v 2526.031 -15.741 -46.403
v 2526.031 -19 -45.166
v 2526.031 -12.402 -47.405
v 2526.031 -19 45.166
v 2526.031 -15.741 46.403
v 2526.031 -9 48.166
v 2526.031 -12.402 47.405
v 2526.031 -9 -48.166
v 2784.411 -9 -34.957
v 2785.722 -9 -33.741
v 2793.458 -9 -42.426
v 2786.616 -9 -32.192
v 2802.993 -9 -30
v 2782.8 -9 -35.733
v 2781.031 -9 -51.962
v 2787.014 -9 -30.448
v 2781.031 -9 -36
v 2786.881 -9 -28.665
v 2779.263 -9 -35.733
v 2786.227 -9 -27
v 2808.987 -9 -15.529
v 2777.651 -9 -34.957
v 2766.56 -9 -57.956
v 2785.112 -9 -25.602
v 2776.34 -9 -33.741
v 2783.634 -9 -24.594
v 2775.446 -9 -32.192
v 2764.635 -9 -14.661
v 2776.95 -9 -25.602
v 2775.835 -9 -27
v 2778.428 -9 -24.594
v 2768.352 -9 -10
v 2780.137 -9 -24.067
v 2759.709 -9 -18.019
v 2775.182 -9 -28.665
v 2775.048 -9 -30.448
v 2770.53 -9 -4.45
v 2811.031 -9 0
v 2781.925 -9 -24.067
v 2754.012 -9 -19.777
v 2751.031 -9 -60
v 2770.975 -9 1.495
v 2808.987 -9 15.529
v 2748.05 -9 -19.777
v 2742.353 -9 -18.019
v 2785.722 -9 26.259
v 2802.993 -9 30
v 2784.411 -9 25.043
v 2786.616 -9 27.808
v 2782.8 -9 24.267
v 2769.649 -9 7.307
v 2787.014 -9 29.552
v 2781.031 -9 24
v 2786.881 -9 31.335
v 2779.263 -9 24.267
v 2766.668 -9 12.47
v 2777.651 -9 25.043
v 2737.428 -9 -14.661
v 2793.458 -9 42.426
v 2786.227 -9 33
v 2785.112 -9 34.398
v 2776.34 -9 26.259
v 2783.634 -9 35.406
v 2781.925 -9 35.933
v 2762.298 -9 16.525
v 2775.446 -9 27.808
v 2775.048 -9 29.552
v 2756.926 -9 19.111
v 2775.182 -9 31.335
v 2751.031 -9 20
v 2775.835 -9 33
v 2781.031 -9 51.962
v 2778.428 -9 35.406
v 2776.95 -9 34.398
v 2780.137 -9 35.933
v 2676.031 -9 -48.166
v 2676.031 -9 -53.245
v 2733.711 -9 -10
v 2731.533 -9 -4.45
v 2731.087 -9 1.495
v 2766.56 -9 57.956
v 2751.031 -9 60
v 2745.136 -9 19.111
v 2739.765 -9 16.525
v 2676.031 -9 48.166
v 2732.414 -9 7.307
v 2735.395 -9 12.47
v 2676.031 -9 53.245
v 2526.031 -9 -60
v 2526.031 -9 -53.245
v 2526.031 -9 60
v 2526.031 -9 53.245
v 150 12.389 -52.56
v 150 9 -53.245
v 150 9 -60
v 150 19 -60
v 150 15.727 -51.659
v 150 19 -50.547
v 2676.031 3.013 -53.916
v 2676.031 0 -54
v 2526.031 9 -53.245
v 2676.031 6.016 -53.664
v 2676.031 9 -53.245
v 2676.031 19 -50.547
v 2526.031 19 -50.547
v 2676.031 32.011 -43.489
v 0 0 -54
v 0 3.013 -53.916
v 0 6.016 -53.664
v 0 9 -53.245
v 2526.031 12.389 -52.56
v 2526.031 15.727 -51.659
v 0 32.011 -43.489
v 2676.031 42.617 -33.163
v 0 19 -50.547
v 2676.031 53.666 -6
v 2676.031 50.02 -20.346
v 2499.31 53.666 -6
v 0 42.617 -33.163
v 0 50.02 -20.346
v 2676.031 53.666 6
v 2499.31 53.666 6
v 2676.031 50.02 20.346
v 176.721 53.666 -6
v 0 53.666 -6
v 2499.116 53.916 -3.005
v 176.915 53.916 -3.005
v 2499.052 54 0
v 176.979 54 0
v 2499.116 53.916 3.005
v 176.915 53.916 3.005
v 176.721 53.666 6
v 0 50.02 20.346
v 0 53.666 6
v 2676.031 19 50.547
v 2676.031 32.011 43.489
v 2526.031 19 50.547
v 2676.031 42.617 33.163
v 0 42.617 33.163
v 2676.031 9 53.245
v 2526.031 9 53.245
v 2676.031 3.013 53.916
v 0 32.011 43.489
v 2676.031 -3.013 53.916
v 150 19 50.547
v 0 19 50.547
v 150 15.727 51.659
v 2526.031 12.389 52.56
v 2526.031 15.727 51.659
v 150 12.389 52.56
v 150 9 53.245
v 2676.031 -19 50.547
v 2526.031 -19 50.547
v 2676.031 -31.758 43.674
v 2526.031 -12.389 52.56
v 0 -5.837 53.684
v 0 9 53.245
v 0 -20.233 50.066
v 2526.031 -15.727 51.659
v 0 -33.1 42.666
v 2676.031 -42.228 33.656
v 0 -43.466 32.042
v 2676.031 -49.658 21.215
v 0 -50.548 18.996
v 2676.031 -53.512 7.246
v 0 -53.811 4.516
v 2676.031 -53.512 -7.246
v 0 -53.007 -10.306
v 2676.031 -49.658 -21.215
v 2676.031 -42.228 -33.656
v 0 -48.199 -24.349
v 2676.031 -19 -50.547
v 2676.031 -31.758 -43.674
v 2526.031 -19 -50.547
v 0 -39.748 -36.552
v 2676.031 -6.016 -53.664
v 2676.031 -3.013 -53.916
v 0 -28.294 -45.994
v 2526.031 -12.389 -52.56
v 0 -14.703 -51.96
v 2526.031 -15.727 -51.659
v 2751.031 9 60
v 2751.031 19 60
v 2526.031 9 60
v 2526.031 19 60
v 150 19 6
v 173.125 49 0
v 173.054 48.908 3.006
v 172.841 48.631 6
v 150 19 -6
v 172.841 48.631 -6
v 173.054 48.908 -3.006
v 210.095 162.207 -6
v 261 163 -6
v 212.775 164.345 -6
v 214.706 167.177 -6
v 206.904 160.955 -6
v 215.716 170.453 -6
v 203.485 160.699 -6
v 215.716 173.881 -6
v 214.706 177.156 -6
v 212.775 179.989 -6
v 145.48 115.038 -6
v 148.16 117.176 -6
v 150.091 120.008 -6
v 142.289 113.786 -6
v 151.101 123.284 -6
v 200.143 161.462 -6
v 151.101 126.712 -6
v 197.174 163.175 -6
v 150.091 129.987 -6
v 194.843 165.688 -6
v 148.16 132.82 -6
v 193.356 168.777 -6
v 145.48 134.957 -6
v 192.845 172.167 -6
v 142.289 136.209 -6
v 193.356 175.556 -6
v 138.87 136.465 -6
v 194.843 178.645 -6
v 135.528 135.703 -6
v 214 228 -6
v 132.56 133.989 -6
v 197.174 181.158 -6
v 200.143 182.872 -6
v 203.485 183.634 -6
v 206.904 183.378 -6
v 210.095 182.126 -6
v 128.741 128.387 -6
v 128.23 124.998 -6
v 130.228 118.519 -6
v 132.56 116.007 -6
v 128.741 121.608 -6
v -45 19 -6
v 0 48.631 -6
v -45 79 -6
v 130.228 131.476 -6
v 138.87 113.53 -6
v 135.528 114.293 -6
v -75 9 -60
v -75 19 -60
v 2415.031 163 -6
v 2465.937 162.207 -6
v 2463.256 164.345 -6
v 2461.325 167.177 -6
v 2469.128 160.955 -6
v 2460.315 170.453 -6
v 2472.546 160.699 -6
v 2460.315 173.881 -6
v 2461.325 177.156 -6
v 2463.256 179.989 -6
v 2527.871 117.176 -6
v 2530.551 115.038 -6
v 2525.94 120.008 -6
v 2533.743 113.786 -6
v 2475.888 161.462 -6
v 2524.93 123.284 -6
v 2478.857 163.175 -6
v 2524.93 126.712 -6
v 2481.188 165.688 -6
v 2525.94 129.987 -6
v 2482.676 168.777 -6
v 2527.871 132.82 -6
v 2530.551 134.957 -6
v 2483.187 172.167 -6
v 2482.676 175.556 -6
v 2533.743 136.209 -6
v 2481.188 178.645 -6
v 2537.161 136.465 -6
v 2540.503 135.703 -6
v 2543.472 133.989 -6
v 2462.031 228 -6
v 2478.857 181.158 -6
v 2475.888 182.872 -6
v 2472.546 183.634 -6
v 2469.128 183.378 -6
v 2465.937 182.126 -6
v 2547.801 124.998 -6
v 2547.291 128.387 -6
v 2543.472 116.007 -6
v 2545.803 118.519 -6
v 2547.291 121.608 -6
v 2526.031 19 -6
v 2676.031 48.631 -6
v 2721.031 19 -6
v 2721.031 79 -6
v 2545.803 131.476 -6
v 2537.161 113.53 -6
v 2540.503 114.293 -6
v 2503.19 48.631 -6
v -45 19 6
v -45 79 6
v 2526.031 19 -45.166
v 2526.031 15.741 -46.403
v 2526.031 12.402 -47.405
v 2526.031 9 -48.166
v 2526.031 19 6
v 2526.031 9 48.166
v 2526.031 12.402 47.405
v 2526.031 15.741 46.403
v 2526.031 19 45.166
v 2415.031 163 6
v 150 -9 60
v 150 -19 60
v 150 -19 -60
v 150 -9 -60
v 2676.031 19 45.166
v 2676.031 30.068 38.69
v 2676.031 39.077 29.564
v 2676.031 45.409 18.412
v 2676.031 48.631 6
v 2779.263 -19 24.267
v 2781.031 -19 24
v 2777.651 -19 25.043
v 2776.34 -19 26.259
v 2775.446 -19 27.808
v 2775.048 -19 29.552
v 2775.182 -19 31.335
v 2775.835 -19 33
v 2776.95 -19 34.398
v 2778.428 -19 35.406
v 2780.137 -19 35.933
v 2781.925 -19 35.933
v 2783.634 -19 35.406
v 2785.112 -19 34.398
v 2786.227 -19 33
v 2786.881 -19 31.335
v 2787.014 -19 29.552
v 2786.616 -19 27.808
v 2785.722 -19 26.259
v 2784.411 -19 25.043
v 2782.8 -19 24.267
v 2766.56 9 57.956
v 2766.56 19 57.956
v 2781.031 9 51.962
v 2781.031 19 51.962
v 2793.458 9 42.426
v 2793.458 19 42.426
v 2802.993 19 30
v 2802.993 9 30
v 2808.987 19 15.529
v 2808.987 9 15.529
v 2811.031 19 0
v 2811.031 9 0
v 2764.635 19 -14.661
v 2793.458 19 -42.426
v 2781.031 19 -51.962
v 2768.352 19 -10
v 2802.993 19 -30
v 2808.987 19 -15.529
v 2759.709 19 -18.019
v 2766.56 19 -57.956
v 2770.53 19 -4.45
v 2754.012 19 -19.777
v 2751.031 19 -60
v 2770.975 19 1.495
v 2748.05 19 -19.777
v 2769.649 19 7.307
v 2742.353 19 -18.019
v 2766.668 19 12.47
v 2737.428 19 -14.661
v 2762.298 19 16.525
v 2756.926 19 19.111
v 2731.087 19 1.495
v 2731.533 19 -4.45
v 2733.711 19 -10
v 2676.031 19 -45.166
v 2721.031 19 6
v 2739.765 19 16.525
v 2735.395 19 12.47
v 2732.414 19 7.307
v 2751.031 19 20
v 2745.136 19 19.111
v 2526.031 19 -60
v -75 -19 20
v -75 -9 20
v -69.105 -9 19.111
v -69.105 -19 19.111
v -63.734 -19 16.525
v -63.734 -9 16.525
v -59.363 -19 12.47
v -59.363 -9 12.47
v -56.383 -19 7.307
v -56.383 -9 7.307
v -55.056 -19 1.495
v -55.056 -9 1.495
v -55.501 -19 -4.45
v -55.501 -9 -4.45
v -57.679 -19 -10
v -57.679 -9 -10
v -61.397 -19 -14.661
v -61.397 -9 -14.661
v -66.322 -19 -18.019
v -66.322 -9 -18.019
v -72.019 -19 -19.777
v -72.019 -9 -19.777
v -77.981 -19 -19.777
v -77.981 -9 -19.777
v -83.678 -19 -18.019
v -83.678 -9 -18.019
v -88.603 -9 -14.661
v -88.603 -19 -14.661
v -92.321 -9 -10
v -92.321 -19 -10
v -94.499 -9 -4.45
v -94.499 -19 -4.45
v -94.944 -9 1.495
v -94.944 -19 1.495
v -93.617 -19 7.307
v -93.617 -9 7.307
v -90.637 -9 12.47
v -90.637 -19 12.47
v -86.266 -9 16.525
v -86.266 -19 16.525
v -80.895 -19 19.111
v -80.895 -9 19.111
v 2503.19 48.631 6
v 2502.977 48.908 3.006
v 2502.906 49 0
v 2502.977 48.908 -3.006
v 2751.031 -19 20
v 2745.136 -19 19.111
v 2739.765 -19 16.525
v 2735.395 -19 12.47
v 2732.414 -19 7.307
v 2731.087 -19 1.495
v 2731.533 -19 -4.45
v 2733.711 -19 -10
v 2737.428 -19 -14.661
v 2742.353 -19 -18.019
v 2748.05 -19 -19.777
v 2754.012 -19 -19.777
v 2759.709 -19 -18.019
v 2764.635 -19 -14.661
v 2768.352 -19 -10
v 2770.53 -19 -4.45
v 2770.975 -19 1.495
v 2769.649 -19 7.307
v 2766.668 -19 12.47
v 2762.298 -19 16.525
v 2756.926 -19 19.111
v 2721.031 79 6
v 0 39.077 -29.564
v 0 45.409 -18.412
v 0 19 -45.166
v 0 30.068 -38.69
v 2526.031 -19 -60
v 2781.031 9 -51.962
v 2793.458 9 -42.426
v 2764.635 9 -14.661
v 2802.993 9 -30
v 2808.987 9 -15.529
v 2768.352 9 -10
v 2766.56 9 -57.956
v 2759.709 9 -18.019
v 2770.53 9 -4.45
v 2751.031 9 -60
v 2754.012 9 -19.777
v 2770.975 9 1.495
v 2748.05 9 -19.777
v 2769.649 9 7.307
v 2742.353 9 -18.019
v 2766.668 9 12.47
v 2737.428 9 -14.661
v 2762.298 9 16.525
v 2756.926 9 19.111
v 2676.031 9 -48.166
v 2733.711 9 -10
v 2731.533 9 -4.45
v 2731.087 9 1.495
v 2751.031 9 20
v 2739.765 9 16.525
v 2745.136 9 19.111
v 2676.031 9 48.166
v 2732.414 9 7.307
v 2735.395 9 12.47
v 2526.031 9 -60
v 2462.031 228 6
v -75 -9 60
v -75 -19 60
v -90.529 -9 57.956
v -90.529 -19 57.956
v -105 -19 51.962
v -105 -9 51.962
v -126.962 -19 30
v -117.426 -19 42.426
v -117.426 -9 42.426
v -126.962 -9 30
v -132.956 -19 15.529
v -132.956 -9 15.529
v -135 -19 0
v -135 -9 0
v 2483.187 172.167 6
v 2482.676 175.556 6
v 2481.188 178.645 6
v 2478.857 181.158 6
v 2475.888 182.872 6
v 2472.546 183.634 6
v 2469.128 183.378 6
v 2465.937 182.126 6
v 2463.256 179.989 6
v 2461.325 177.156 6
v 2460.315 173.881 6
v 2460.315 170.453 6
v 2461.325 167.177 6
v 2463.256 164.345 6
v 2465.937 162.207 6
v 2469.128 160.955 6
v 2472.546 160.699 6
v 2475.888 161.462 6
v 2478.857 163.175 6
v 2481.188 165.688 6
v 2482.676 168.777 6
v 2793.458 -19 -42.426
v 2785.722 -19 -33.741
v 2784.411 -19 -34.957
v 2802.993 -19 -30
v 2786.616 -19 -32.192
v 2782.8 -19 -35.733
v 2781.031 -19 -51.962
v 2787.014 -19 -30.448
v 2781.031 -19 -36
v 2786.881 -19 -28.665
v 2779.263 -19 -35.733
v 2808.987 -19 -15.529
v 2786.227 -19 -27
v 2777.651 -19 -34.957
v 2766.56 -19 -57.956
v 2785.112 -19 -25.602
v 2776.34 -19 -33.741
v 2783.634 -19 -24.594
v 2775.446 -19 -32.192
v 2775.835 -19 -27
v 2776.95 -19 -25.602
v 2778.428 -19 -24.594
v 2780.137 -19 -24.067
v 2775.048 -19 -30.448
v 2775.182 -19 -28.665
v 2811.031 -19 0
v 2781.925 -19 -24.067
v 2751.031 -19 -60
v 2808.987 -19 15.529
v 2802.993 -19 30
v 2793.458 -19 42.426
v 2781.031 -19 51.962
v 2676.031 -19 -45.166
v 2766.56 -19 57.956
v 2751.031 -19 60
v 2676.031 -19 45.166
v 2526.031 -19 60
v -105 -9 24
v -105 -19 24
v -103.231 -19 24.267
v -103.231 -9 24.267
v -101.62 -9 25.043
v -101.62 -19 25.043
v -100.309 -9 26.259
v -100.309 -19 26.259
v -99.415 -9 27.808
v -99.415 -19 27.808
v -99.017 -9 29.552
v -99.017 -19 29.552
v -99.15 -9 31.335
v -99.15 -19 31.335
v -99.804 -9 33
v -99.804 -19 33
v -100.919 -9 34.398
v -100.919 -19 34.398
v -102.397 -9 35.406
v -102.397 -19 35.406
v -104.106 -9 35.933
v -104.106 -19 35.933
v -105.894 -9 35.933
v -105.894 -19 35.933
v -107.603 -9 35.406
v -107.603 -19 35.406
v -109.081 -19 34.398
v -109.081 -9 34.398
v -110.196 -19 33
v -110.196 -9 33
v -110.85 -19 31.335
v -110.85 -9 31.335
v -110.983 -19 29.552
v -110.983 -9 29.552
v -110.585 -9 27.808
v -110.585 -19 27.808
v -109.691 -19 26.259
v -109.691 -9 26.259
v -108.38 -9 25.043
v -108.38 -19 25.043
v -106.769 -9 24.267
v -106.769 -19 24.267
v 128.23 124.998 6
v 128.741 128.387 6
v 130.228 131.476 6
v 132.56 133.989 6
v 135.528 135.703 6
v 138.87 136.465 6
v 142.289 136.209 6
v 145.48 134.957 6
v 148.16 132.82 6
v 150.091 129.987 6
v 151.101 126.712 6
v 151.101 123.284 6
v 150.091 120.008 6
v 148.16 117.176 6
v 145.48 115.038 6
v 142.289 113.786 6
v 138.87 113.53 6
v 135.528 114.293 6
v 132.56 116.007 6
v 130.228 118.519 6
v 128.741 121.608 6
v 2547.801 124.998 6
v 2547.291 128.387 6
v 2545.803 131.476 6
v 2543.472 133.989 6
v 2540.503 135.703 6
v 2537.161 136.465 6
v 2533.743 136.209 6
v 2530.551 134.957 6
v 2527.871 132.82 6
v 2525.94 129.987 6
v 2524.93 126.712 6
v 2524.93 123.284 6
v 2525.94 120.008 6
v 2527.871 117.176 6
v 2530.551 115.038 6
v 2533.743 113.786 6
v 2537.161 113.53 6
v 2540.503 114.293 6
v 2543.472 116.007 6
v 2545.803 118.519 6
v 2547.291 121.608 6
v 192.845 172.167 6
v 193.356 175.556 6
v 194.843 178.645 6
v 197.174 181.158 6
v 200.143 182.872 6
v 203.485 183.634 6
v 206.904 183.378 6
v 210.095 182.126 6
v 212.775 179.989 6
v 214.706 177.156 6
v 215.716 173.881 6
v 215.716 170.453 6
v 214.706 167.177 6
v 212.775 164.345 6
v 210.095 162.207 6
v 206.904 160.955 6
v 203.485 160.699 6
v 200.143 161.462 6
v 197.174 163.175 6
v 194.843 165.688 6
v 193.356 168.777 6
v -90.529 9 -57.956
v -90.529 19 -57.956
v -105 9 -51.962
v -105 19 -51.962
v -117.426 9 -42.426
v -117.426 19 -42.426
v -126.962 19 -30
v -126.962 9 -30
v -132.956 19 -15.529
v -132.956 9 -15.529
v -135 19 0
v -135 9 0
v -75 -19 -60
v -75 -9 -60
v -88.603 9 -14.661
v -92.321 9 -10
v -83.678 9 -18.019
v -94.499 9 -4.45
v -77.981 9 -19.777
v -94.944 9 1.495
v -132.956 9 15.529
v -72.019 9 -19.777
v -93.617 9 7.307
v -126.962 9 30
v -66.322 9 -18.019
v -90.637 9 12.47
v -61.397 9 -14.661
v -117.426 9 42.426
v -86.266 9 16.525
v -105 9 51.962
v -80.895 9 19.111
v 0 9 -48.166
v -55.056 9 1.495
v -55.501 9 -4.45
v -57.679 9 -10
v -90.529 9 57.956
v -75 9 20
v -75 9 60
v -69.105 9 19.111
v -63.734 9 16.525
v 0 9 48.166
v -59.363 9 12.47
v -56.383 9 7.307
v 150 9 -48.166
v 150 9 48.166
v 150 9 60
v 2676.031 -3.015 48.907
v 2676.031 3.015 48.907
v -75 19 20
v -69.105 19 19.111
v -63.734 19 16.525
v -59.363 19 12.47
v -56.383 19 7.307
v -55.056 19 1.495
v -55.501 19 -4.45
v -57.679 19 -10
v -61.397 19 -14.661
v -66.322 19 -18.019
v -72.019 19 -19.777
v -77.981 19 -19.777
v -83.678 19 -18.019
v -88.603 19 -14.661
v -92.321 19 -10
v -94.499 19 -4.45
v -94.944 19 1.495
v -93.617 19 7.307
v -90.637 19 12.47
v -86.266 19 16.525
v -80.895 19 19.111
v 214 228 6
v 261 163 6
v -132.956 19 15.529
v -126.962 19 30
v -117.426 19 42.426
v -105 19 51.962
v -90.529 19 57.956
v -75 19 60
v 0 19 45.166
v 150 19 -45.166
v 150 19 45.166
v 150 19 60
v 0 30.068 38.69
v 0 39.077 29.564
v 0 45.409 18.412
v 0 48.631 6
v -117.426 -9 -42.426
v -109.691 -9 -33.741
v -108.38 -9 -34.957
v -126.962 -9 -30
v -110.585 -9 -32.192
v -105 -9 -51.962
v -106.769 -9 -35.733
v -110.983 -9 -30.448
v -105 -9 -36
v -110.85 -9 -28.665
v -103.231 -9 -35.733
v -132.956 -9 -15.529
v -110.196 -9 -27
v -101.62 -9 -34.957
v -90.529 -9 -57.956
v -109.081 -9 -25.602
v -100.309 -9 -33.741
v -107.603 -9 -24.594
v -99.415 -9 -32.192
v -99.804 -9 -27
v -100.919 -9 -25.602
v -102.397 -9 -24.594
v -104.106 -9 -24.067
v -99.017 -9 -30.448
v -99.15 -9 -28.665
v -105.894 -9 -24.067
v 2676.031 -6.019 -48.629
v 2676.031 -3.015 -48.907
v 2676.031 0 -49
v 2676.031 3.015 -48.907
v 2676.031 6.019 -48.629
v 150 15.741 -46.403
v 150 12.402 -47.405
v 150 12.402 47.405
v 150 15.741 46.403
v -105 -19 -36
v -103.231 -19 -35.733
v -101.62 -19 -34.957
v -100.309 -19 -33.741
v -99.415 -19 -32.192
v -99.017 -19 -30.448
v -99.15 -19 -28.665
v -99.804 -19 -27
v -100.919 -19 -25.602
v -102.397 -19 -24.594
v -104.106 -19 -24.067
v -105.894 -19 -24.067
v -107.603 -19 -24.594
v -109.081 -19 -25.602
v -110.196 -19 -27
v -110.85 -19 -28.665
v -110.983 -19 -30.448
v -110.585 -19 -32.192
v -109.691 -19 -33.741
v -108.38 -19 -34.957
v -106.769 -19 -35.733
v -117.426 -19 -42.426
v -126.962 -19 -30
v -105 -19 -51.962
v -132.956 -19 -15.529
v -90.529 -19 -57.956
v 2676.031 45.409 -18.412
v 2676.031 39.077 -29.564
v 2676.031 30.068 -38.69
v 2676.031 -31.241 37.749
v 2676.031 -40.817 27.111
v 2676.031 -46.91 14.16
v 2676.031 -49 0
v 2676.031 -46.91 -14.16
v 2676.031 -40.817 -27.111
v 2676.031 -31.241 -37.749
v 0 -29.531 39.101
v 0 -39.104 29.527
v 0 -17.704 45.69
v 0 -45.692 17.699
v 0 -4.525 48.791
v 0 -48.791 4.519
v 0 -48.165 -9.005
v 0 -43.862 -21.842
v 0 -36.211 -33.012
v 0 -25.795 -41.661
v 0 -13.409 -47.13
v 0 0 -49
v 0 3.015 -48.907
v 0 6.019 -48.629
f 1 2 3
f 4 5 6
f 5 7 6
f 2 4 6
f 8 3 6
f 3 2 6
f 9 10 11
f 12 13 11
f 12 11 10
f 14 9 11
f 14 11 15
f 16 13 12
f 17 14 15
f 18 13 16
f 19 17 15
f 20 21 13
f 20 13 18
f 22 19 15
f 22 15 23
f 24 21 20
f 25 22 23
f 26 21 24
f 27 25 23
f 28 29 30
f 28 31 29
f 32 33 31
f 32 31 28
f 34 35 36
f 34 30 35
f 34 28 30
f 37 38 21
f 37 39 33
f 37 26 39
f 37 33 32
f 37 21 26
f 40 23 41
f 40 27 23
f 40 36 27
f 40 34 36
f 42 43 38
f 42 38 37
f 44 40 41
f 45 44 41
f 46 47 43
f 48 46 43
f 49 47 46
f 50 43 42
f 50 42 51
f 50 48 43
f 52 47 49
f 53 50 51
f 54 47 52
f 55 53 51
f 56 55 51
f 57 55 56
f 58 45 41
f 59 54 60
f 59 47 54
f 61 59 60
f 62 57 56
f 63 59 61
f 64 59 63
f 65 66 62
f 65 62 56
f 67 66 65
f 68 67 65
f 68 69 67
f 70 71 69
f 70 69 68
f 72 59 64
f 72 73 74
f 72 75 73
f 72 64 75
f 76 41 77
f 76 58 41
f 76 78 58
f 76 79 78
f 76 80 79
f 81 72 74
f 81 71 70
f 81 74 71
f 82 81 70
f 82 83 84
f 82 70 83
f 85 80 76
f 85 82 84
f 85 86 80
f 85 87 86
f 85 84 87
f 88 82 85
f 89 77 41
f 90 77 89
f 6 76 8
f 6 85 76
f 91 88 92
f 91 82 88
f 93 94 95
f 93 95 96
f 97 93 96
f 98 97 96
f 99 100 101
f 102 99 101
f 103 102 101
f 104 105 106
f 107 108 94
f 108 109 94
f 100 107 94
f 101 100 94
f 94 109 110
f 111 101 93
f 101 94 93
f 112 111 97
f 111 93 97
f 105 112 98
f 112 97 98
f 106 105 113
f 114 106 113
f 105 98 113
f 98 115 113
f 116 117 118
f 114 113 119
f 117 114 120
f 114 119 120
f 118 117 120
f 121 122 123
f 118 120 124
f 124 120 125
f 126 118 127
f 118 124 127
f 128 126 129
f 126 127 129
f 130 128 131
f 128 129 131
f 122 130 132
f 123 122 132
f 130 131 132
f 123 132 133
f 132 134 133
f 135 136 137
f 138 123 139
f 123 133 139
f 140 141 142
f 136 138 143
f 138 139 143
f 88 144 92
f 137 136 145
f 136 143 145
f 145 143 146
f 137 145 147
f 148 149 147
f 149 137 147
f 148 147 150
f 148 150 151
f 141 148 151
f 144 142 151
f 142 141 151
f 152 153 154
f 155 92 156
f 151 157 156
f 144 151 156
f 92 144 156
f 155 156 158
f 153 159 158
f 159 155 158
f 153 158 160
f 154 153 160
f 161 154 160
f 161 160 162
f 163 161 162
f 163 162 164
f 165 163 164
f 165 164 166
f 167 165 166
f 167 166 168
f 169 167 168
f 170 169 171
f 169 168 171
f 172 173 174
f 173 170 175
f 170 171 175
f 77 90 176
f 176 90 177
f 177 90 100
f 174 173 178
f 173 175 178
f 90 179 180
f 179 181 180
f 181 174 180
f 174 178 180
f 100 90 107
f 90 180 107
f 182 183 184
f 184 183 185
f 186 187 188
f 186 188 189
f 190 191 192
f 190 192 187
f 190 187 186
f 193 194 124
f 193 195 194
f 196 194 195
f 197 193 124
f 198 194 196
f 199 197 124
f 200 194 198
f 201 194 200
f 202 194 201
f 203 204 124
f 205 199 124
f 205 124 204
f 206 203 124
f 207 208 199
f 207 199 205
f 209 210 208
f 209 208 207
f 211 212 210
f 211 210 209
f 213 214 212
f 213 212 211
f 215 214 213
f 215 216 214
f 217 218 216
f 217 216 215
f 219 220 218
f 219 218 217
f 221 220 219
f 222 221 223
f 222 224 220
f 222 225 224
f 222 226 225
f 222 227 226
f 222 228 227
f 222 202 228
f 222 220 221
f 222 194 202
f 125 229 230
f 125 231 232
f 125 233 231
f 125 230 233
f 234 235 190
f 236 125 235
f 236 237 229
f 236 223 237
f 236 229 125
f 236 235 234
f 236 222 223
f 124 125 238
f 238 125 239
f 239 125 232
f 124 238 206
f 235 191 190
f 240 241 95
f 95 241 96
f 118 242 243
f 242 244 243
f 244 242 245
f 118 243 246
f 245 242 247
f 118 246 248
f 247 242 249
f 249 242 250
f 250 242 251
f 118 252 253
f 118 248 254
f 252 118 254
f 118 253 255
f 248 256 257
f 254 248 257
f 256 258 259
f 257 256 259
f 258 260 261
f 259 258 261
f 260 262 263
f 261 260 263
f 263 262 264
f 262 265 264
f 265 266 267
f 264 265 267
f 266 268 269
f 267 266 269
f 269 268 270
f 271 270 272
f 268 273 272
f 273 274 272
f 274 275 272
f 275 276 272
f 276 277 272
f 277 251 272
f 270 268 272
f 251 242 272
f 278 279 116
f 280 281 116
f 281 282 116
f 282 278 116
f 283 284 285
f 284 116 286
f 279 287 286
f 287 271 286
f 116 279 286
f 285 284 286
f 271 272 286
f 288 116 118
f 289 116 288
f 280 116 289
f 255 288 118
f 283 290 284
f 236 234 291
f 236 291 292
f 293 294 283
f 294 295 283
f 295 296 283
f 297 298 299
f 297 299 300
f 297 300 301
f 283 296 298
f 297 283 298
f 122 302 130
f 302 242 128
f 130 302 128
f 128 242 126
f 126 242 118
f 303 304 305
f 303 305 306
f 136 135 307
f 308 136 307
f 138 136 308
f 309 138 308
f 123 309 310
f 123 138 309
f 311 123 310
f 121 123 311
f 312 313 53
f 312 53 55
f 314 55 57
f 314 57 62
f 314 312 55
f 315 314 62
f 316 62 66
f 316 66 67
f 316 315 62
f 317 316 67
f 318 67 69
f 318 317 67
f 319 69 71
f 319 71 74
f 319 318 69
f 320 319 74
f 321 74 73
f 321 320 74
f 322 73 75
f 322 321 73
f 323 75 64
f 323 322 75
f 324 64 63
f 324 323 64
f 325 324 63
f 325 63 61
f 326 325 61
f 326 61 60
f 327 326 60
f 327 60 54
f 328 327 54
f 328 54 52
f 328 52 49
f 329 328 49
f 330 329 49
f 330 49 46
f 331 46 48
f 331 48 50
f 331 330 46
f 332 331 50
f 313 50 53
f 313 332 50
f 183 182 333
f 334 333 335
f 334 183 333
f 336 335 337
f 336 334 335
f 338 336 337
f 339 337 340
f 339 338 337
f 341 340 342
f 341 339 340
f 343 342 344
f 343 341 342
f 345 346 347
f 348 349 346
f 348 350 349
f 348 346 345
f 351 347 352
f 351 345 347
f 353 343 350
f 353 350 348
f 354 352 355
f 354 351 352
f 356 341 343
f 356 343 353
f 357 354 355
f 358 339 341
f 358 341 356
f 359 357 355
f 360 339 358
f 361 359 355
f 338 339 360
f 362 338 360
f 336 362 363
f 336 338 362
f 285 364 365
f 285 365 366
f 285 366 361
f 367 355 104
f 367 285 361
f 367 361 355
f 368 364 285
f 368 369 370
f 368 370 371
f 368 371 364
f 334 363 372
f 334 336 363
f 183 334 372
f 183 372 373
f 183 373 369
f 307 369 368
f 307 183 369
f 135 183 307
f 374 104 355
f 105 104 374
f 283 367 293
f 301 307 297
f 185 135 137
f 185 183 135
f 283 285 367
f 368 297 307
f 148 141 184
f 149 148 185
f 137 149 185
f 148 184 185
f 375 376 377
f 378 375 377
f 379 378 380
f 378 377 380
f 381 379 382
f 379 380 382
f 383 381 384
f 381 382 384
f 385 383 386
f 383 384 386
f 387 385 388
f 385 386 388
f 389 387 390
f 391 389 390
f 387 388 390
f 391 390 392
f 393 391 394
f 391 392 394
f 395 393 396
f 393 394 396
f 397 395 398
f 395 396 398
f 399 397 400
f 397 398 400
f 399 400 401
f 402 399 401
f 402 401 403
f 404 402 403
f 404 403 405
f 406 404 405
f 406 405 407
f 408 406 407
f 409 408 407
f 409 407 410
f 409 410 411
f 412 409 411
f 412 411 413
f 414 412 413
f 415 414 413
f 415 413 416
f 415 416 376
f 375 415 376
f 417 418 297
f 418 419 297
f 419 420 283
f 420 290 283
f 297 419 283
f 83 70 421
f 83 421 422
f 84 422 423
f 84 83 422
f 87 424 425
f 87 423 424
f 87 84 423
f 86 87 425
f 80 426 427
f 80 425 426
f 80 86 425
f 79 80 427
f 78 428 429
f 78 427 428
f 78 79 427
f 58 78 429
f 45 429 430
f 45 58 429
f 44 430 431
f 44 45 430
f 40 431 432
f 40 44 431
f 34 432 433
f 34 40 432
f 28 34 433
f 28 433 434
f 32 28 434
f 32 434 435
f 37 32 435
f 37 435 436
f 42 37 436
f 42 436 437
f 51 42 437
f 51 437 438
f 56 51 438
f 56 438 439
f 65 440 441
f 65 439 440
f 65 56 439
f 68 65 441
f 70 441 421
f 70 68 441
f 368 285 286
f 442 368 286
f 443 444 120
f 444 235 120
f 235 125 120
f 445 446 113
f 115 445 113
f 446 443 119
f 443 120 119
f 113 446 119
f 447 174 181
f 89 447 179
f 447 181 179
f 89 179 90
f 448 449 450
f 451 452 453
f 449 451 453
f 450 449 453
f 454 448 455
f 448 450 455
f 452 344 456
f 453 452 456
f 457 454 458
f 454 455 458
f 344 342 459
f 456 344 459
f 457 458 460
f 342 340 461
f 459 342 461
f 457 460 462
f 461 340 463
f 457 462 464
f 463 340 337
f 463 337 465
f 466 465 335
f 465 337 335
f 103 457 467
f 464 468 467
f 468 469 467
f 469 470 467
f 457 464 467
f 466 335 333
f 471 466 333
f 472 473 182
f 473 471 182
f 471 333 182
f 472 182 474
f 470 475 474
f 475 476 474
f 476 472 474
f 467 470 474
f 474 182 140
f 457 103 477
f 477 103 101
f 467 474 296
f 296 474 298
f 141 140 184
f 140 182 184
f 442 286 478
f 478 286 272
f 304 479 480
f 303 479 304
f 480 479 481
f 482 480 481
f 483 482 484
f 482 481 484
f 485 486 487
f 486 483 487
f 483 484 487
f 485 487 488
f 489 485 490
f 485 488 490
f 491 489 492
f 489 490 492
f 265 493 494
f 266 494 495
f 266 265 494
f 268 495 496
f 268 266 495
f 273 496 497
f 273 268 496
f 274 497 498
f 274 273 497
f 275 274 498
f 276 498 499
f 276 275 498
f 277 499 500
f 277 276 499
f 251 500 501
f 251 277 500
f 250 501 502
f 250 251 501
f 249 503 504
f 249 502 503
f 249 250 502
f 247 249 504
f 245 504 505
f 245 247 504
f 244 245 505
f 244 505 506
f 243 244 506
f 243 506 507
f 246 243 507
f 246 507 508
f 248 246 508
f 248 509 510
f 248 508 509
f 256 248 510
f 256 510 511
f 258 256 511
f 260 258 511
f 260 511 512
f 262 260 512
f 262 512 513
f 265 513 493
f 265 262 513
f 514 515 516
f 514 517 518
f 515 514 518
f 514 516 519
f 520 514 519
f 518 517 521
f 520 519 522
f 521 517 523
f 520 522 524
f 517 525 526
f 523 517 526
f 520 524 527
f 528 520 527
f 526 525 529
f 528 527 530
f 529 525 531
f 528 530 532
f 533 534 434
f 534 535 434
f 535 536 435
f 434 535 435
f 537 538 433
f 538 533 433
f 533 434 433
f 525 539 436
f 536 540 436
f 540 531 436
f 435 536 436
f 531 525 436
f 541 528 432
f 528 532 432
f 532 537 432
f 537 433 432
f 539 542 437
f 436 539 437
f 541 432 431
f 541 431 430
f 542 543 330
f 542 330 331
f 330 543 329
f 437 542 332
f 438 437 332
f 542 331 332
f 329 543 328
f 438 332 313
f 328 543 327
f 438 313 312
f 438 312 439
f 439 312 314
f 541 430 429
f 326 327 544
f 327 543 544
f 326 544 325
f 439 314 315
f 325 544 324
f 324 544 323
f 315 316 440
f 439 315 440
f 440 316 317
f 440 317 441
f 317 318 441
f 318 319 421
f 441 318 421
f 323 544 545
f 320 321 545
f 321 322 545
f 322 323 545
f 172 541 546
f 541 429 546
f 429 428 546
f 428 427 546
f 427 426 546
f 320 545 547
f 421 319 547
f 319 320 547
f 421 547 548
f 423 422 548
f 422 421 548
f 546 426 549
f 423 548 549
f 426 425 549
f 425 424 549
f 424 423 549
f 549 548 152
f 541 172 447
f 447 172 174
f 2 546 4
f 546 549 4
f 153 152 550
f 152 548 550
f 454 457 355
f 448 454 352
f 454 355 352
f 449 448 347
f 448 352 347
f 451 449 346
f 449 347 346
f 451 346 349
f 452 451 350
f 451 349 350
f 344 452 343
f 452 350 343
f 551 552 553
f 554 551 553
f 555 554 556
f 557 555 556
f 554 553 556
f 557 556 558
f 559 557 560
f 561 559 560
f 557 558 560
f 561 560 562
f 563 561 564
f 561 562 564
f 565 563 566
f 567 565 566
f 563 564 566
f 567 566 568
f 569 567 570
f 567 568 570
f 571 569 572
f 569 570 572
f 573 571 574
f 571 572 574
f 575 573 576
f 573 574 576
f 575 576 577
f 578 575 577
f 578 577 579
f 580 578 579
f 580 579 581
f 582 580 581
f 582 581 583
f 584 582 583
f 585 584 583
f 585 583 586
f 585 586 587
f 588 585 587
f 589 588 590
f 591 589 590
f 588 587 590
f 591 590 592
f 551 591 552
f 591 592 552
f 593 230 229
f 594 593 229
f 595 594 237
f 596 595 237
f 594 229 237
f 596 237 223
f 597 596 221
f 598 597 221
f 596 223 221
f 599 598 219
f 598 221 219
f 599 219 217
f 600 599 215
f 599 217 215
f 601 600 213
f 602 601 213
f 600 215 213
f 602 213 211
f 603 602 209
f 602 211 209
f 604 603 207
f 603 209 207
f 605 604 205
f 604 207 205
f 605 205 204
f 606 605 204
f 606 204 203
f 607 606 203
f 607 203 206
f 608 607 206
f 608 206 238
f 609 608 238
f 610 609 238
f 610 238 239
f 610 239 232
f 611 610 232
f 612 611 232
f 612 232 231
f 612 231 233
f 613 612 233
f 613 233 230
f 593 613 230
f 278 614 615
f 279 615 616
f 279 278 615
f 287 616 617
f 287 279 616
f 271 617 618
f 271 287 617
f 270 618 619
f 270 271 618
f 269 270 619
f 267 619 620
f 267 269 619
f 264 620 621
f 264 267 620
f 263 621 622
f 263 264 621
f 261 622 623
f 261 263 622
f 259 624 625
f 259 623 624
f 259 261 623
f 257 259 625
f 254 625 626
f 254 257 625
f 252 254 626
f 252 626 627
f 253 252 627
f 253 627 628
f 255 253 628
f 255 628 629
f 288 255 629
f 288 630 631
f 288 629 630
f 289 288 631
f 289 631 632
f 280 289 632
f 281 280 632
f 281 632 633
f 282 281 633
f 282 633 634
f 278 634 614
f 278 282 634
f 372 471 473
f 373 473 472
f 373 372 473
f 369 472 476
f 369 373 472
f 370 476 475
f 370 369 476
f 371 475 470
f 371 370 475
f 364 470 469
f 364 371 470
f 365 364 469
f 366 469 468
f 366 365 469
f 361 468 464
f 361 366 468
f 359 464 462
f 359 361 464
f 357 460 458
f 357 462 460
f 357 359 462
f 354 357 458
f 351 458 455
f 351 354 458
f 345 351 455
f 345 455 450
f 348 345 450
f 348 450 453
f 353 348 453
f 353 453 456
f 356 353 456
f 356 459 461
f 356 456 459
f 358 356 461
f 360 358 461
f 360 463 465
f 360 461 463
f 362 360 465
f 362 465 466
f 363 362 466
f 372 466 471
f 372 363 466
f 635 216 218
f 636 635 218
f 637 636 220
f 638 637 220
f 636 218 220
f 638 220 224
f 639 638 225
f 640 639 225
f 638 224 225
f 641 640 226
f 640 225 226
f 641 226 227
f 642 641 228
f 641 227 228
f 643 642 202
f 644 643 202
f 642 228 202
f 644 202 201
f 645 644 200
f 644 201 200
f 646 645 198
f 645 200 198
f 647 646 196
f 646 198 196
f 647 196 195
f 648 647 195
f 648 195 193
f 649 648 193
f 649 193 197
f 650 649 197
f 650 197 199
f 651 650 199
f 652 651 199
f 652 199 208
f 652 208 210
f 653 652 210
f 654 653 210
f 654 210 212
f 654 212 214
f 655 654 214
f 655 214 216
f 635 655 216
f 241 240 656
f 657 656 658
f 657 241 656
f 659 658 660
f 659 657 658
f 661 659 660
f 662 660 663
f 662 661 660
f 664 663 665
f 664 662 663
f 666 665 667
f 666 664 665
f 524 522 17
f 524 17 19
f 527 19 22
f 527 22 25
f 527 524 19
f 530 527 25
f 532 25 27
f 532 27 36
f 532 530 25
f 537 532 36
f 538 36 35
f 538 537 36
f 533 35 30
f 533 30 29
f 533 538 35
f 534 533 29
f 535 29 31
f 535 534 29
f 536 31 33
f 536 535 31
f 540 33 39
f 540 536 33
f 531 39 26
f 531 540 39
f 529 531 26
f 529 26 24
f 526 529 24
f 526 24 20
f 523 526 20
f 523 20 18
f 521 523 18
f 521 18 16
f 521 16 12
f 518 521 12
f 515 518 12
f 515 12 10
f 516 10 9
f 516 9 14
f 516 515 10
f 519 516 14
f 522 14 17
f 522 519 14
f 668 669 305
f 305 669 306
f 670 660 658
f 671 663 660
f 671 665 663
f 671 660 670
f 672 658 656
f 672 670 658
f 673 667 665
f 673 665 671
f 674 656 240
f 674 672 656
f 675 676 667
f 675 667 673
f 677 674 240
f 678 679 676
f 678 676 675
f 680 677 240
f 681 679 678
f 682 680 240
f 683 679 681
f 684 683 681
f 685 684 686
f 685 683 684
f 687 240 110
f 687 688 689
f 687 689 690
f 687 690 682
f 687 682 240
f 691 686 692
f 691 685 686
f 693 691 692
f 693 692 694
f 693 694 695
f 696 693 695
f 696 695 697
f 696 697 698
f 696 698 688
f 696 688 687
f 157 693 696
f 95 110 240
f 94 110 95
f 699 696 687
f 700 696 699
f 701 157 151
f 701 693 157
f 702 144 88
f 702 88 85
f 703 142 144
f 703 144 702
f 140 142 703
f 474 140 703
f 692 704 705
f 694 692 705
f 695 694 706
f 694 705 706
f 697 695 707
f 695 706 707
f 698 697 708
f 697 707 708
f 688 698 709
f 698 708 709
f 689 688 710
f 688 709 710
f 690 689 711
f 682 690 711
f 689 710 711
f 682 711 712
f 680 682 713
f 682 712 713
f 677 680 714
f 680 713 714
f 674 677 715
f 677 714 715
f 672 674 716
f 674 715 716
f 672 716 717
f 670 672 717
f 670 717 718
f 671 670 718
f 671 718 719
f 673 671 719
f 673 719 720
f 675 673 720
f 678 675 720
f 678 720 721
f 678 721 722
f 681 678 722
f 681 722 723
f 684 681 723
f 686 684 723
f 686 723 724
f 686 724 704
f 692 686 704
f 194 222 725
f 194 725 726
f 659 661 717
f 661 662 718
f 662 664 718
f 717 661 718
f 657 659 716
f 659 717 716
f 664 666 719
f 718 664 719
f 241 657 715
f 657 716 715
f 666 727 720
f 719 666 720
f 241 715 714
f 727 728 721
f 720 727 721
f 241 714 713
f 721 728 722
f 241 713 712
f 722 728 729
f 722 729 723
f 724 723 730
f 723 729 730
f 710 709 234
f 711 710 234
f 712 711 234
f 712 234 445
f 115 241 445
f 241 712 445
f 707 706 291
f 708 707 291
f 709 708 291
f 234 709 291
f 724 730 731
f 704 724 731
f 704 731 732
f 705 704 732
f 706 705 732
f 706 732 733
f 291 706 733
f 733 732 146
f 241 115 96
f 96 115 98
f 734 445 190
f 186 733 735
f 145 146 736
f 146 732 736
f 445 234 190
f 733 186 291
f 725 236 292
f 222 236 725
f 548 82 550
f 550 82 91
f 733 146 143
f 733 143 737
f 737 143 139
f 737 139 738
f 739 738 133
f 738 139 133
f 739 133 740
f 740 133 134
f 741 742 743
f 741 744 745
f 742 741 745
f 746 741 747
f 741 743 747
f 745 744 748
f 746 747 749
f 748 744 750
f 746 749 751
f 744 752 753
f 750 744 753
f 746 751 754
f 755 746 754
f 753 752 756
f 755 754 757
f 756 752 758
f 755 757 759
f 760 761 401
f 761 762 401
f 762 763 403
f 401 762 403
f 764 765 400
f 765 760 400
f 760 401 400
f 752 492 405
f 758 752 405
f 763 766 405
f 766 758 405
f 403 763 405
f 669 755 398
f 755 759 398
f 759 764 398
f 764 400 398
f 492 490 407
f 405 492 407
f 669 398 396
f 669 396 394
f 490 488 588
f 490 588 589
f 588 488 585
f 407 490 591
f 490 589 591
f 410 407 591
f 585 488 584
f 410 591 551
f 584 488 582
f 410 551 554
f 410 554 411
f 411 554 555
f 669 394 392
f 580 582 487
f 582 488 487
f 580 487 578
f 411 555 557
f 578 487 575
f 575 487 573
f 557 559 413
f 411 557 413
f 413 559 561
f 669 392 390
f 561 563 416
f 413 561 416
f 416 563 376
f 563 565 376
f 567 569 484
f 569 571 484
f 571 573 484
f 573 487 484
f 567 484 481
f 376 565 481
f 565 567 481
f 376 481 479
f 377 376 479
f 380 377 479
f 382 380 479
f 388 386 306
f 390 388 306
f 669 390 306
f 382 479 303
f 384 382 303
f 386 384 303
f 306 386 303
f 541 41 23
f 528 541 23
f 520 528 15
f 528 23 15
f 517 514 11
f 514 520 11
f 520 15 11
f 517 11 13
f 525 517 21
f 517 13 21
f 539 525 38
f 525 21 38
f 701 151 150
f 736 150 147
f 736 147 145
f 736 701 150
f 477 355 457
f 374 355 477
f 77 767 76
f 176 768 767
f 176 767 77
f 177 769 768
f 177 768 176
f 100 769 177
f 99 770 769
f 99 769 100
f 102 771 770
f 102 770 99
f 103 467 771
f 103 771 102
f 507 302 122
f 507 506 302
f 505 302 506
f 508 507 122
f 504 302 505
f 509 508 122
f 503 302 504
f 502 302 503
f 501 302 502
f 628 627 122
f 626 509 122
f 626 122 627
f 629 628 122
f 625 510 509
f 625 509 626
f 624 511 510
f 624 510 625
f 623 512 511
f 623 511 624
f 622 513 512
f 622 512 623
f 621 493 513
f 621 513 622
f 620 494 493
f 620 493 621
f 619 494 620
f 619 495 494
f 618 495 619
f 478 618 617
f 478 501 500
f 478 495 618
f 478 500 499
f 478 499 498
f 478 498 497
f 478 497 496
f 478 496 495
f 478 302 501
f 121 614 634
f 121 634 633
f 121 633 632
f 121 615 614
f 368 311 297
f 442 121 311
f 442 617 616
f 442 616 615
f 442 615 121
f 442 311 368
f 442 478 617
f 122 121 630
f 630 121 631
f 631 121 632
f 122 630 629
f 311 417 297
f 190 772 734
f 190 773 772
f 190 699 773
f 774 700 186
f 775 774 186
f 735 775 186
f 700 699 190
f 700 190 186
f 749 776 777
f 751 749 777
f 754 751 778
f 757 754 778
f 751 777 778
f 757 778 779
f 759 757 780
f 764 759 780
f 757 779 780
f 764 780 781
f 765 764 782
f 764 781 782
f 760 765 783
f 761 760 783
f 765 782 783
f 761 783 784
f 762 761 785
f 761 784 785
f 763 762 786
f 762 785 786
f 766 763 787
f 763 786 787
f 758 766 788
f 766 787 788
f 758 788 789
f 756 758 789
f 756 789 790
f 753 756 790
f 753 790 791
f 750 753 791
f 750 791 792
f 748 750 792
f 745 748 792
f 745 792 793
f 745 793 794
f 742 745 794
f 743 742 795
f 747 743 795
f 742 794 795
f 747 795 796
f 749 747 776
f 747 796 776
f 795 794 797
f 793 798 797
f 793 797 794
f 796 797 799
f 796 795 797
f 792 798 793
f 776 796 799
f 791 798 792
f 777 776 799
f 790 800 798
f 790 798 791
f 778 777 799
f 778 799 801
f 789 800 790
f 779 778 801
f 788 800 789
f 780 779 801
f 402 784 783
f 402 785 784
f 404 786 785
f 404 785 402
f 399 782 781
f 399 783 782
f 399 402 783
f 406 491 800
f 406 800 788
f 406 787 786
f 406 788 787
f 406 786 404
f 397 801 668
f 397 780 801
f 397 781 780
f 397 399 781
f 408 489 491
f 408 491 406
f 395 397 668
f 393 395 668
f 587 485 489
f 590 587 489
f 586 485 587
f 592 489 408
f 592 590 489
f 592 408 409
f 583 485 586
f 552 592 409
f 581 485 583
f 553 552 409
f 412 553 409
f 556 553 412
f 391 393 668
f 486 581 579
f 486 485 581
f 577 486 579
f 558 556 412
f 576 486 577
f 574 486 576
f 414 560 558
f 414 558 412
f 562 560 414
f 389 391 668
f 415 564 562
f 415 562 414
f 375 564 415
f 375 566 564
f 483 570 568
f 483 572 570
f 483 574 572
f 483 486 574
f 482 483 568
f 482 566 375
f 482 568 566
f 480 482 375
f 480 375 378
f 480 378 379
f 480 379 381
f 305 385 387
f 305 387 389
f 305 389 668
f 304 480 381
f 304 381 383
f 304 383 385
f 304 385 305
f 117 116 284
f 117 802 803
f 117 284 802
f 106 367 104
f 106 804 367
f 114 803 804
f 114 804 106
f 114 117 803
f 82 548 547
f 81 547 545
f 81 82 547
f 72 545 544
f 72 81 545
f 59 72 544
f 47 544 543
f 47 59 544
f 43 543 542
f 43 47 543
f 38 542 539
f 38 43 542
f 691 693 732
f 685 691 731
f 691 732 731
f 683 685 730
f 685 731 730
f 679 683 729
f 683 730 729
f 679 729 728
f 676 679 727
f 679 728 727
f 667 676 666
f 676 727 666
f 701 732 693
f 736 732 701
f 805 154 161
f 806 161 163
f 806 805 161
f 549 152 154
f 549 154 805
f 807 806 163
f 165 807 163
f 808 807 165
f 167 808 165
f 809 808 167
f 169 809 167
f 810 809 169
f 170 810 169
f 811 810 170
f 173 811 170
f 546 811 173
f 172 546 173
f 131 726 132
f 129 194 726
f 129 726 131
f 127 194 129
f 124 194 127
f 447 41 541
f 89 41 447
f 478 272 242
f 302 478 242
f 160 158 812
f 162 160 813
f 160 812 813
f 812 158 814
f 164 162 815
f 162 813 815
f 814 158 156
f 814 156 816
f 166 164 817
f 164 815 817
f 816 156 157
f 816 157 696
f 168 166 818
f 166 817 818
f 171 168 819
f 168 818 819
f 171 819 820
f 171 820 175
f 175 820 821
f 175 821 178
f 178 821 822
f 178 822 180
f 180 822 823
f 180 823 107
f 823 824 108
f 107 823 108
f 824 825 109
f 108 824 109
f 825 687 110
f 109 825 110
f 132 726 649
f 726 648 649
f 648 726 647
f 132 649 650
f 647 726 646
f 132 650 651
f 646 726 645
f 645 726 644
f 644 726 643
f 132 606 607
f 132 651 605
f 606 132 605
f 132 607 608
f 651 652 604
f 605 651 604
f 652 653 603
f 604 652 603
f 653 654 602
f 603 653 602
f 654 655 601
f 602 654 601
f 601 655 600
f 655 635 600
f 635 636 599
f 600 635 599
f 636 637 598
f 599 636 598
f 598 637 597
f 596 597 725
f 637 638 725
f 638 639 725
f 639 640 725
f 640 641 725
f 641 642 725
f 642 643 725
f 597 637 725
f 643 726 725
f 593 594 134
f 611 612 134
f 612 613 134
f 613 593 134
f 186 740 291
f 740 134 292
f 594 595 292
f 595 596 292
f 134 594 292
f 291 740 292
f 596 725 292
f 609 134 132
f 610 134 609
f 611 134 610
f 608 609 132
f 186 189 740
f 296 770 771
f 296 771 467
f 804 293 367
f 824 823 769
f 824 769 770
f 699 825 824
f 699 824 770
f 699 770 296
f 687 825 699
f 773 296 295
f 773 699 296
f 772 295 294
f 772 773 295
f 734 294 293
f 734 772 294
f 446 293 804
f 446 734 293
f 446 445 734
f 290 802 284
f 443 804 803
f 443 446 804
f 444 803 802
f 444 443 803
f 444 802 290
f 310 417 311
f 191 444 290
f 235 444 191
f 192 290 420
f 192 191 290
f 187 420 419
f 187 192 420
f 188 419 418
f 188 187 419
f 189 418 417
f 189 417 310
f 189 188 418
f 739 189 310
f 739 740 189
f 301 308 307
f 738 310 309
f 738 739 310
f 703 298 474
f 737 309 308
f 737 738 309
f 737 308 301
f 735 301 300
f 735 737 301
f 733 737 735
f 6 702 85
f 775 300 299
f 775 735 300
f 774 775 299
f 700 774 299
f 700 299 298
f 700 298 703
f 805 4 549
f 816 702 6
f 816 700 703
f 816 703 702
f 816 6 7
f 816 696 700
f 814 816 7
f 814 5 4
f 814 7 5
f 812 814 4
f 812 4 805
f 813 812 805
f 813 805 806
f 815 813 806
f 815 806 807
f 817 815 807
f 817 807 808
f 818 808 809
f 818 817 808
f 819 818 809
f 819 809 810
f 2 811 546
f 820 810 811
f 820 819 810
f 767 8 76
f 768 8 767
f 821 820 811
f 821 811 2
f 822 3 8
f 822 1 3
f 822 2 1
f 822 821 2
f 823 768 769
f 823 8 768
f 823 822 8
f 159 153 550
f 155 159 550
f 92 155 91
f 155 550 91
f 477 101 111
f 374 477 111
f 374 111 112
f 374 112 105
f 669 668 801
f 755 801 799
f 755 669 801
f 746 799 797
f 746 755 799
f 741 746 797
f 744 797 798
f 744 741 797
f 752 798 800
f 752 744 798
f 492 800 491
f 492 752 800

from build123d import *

# Parameters (mm, degrees)
SKETCH_1_R          = 54
SKETCH_1_R_2        = 49
EXTRUDE_1_DEPTH     = 2676.031139248
SKETCH_2_W          = 285
SKETCH_2_H          = 10
EXTRUDE_2_DEPTH     = 120
EXTRUDE_2_2_DEPTH   = 120
CUT_EXTRUDE_1_DEPTH = 2678.698948393
CUT_EXTRUDE_2_DEPTH = 2678.698948393
SKETCH_5_R          = 20
CUT_EXTRUDE_3_DEPTH = 2678.698948393
SKETCH_8_R          = 6
CUT_EXTRUDE_4_DEPTH = 10
EXTRUDE_4_DEPTH     = 12
SKETCH_12_R         = 11.5
CUT_EXTRUDE_5_DEPTH = 2687.537298871


with BuildPart() as part:
    # 草图1 → 凸台-拉伸1 (new body)
    with BuildSketch(Plane(origin=(0, 0, 0), x_dir=(0, 0, -1), z_dir=(1, 0, 0))):
        Circle(SKETCH_1_R)
        Circle(SKETCH_1_R_2, mode=Mode.SUBTRACT)
    extrude(amount=EXTRUDE_1_DEPTH)



with BuildPart() as body_2:
    # 草图2 → 凸台-拉伸2 (new body)
    with BuildSketch(Plane.XY.offset(60)):
        with Locations((7.5, 14)):
            Rectangle(SKETCH_2_W, SKETCH_2_H)
    extrude_2 = extrude(amount=-EXTRUDE_2_DEPTH)


with BuildPart() as body_3:
    # 草图2 → Extrude 2 2 (new body)
    with BuildSketch(Plane.XY.offset(60)):
        with Locations((7.5, -14)):
            Rectangle(SKETCH_2_W, SKETCH_2_H)
    extrude_2_2 = extrude(amount=-EXTRUDE_2_2_DEPTH)


with BuildPart() as cut_extrude_1_tool:
    # 草图3 → 切除-拉伸1 (new, through all)
    with BuildSketch(Plane(origin=(0, 19, 0), x_dir=(1, 0, 0), z_dir=(0, 1, 0))):
        with BuildLine():
            Line((-135, 0), (-135, 60))
            Line((-135, 60), (-75, 60))
            ThreePointArc((-75, 60), (-117.426406871, 42.426406871), (-135, 0))
        make_face()
    cut_extrude_1 = extrude(amount=-CUT_EXTRUDE_1_DEPTH)


with BuildPart() as body_2_1:
    add(body_2.part)

    # 切除-拉伸1: cut by cut_extrude_1_tool
    add(cut_extrude_1_tool.part, mode=Mode.SUBTRACT)


with BuildPart() as body_3_1:
    add(body_3.part)

    # 切除-拉伸1: cut by cut_extrude_1_tool
    add(cut_extrude_1_tool.part, mode=Mode.SUBTRACT)


with BuildPart() as cut_extrude_2_tool:
    # 草图4 → 切除-拉伸2 (new, through all)
    with BuildSketch(Plane(origin=(0, 19, 0), x_dir=(1, 0, 0), z_dir=(0, 1, 0))):
        with BuildLine():
            Line((-135, 0), (-135, -60))
            Line((-135, -60), (-75, -60))
            ThreePointArc((-75, -60), (-117.426406871, -42.426406871), (-135, 0))
        make_face()
    cut_extrude_2 = extrude(amount=-CUT_EXTRUDE_2_DEPTH)


with BuildPart() as body_2_2:
    add(body_2_1.part)

    # 切除-拉伸2: cut by cut_extrude_2_tool
    add(cut_extrude_2_tool.part, mode=Mode.SUBTRACT)


with BuildPart() as body_3_2:
    add(body_3_1.part)

    # 切除-拉伸2: cut by cut_extrude_2_tool
    add(cut_extrude_2_tool.part, mode=Mode.SUBTRACT)


with BuildPart() as cut_extrude_3_tool:
    # 草图5 → 切除-拉伸3 (new, through all)
    with BuildSketch(Plane(origin=(0, 19, 0), x_dir=(1, 0, 0), z_dir=(0, 1, 0))):
        with Locations(Location((-75, 0, 0), (0, 0, 270))):
            Circle(SKETCH_5_R)
    cut_extrude_3 = extrude(amount=-CUT_EXTRUDE_3_DEPTH)


with BuildPart() as body_2_3:
    add(body_2_2.part)

    # 切除-拉伸3: cut by cut_extrude_3_tool
    add(cut_extrude_3_tool.part, mode=Mode.SUBTRACT)


with BuildPart() as body_3_3:
    add(body_3_2.part)

    # 切除-拉伸3: cut by cut_extrude_3_tool
    add(cut_extrude_3_tool.part, mode=Mode.SUBTRACT)

    # 草图8 → 切除-拉伸4 (cut)
    with BuildSketch(Plane.XZ.offset(19)):
        with Locations(Location((-105, 30, 0), (0, 0, 270))):
            Circle(SKETCH_8_R)
        with Locations(Location((-105, -30, 0), (0, 0, 270))):
            Circle(SKETCH_8_R)
    cut_extrude_4 = extrude(amount=-CUT_EXTRUDE_4_DEPTH, mode=Mode.SUBTRACT)


with BuildPart() as part_1:
    add(part.part)

    add(body_2_3.part)  # 凸台-拉伸4 merges body 2
    # 草图11 → 凸台-拉伸4 (add)
    with BuildSketch(Plane.XY.offset(-6)):
        Polygon((150, 19), (-45, 19), (-45, 79), (214, 228), (261, 163), align=None)
    extrude_4 = extrude(amount=EXTRUDE_4_DEPTH)

    # 草图12 → 切除-拉伸5 (cut, through all)
    with BuildSketch(Plane(origin=(0, 0, -6), x_dir=(-1, 0, 0), z_dir=(0, 0, -1))):
        with Locations((-204.344601324, 172.166558966)):
            Circle(SKETCH_12_R)
        with Locations((-139.729642057, 124.997638702)):
            Circle(SKETCH_12_R)
    cut_extrude_5 = extrude(amount=-CUT_EXTRUDE_5_DEPTH, mode=Mode.SUBTRACT)

    # 镜向2: 凸台-拉伸2, Extrude 2 2, 切除-拉伸1, 切除-拉伸2, 切除-拉伸3, 切除-拉伸4, 凸台-拉伸4, 切除-拉伸5 across plane
    add(extrude_2.mirror(Plane(origin=(1338.015569624, 0, 0), x_dir=(0, 0, 1), z_dir=(1, 0, 0))))
    add(extrude_2_2.mirror(Plane(origin=(1338.015569624, 0, 0), x_dir=(0, 0, 1), z_dir=(1, 0, 0))))
    add(cut_extrude_1.mirror(Plane(origin=(1338.015569624, 0, 0), x_dir=(0, 0, 1), z_dir=(1, 0, 0))), mode=Mode.SUBTRACT)
    add(cut_extrude_2.mirror(Plane(origin=(1338.015569624, 0, 0), x_dir=(0, 0, 1), z_dir=(1, 0, 0))), mode=Mode.SUBTRACT)
    add(cut_extrude_3.mirror(Plane(origin=(1338.015569624, 0, 0), x_dir=(0, 0, 1), z_dir=(1, 0, 0))), mode=Mode.SUBTRACT)
    add(cut_extrude_4.mirror(Plane(origin=(1338.015569624, 0, 0), x_dir=(0, 0, 1), z_dir=(1, 0, 0))), mode=Mode.SUBTRACT)
    add(extrude_4.mirror(Plane(origin=(1338.015569624, 0, 0), x_dir=(0, 0, 1), z_dir=(1, 0, 0))))
    add(cut_extrude_5.mirror(Plane(origin=(1338.015569624, 0, 0), x_dir=(0, 0, 1), z_dir=(1, 0, 0))), mode=Mode.SUBTRACT)


solid = Compound([body_3_3.part, part_1.part])
